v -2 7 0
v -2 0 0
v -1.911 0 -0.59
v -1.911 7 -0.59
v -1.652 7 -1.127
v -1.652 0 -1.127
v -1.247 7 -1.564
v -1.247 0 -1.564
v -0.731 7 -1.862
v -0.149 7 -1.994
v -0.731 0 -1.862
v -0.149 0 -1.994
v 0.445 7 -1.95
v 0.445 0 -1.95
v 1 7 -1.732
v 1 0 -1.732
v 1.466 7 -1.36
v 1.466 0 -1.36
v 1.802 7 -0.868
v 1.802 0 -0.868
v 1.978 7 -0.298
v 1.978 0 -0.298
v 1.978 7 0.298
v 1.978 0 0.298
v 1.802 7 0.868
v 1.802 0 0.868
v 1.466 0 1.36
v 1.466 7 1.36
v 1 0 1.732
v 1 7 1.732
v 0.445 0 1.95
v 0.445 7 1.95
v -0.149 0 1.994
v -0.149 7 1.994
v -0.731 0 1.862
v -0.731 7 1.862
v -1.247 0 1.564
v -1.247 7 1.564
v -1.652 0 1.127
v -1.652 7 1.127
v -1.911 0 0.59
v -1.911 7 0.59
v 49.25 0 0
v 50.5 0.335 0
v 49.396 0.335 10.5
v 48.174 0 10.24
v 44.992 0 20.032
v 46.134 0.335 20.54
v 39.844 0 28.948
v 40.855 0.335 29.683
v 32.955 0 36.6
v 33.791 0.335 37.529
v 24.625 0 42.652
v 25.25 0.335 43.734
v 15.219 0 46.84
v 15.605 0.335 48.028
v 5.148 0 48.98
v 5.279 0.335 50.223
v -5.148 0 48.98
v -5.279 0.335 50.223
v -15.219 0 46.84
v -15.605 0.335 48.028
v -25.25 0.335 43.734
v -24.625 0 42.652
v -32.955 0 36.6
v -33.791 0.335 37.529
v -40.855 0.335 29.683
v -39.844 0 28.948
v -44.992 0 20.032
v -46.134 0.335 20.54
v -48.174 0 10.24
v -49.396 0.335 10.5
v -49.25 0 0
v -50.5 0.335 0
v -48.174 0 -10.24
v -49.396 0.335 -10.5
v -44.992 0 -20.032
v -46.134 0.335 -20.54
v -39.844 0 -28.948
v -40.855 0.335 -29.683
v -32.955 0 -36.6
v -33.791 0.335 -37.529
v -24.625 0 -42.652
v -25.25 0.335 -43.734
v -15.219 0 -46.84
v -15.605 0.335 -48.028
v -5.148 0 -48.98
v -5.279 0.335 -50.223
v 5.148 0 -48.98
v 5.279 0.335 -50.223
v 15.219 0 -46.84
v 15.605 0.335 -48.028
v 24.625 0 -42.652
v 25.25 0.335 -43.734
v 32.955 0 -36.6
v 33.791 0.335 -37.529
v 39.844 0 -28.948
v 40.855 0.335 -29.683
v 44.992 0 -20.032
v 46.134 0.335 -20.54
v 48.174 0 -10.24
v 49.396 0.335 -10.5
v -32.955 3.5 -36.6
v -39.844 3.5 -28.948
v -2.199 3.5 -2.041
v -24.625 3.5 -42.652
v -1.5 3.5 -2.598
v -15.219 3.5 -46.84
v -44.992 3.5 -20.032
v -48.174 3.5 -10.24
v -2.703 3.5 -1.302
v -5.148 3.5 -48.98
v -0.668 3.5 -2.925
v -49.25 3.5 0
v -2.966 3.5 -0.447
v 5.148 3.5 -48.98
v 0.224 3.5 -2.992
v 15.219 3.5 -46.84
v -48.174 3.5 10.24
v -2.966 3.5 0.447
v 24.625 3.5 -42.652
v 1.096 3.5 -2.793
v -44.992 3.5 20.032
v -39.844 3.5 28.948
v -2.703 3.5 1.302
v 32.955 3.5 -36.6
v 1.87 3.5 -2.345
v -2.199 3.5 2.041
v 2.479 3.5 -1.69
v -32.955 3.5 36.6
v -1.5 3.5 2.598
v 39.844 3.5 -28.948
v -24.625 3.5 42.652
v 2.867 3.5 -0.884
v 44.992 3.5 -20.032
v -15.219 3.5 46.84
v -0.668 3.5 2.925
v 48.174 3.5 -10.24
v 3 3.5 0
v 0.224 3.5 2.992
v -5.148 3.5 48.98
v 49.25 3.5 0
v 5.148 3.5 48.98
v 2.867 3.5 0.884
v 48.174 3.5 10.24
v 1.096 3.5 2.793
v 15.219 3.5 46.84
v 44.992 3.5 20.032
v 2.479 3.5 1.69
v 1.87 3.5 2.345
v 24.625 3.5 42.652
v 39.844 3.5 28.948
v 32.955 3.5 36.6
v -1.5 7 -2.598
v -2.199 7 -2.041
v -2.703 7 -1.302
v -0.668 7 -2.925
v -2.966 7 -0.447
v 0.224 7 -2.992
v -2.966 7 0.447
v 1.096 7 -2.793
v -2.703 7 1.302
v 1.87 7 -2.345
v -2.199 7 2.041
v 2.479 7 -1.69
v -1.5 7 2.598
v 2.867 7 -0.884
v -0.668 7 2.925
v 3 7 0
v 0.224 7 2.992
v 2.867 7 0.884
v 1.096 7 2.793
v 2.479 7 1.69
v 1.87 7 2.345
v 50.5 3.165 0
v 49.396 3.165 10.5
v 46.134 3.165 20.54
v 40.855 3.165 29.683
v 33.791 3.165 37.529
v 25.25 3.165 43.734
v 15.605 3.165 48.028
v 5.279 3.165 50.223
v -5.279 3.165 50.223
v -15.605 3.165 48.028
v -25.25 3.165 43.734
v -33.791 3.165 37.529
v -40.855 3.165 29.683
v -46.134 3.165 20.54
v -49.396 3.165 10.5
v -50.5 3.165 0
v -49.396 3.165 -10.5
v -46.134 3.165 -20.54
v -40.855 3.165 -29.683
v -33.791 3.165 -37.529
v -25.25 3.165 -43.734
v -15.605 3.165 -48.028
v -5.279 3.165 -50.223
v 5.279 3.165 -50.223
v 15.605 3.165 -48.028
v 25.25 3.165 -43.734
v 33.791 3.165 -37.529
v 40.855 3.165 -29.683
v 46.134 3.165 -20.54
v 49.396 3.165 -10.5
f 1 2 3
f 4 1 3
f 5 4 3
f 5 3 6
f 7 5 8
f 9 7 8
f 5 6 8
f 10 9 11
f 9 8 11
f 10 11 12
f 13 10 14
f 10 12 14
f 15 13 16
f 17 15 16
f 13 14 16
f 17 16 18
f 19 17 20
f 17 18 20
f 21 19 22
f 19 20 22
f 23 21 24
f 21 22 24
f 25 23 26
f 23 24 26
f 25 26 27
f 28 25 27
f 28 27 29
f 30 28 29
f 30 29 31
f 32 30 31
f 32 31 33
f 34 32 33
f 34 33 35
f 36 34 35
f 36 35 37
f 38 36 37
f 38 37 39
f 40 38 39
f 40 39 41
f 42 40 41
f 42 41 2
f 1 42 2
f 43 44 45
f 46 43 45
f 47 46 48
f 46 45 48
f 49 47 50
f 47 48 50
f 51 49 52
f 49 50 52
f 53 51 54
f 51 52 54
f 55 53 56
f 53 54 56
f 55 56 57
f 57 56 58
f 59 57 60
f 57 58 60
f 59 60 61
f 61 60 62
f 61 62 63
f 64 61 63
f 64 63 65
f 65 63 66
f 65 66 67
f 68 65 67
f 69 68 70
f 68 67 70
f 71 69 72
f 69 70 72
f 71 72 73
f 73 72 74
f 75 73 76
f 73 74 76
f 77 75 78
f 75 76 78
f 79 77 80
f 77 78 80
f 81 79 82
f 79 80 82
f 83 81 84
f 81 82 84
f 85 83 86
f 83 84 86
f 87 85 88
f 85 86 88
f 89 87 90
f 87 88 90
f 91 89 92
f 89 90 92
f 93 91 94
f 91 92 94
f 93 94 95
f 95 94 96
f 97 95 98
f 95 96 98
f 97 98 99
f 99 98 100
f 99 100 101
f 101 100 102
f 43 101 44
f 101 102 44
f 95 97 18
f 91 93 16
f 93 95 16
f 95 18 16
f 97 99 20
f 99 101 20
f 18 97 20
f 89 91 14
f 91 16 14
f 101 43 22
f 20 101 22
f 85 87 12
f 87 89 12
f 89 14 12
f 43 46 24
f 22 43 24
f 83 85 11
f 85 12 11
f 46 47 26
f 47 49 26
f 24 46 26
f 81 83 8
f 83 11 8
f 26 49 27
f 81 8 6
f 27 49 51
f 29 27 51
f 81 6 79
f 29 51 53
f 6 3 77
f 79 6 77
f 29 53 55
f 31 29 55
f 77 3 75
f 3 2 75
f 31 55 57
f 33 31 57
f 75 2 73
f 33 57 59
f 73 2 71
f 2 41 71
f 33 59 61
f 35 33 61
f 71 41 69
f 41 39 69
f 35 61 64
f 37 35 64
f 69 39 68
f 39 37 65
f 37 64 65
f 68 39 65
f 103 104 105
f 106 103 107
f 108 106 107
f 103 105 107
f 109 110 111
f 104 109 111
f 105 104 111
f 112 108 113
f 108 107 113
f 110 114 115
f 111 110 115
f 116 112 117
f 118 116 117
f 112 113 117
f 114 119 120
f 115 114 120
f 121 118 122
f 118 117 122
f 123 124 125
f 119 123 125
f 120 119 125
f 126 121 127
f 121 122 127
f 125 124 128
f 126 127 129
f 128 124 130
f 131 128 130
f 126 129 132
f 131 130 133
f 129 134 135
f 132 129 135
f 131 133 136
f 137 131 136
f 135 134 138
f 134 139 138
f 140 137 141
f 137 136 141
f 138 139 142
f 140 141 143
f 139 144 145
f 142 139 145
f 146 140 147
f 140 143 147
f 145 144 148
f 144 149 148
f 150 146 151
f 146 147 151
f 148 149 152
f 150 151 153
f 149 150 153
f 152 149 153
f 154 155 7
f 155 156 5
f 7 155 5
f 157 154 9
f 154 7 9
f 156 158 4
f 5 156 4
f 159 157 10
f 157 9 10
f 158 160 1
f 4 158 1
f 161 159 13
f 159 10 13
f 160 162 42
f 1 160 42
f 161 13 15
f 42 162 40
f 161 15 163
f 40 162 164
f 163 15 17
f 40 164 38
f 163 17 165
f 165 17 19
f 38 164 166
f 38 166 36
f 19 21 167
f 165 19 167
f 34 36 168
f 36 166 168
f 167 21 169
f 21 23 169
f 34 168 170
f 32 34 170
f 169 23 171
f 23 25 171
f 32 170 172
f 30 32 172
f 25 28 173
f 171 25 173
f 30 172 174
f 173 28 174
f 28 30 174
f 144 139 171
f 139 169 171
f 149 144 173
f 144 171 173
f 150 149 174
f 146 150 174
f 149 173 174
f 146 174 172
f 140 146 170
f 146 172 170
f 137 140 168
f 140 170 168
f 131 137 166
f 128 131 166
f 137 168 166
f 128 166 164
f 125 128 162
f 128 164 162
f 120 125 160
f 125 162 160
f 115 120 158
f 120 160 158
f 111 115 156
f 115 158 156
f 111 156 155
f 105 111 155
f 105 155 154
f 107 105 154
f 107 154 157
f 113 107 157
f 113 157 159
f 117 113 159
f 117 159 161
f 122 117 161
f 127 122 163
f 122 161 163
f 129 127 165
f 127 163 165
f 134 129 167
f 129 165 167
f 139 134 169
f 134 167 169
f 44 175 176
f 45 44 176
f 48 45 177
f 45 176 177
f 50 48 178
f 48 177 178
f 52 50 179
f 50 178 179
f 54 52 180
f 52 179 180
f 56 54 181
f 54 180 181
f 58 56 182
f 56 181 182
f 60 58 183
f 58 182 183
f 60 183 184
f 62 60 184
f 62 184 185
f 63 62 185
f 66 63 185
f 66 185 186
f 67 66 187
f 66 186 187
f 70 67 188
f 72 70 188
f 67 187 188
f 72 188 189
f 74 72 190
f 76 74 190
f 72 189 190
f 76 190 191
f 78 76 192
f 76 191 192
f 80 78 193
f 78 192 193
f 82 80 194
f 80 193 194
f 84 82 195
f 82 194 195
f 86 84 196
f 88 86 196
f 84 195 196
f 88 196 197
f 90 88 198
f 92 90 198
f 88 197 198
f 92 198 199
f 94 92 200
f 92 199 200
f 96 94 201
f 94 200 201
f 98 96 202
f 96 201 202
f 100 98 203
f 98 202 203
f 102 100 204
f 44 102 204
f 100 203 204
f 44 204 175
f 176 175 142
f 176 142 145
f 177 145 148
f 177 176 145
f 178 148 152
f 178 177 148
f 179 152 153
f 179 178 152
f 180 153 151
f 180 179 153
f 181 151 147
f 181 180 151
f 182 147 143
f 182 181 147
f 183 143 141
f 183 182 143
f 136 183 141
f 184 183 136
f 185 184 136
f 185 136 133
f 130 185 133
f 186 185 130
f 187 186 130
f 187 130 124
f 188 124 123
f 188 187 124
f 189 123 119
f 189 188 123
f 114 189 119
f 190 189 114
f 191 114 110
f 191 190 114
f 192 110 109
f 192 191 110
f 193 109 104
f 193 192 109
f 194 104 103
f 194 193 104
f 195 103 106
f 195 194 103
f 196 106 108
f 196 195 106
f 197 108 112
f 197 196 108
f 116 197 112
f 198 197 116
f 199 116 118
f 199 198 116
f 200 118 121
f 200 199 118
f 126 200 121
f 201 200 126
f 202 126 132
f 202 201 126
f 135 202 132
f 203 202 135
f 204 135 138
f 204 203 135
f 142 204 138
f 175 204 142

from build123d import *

# Parameters (mm, degrees)
CHAMFER_1_SIZE           = 1.25
CHAMFER_1_SIZE2          = 0.334936491
CHAMFER_2_SIZE           = 1.25
CHAMFER_2_SIZE2          = 0.334936491
SKETCH_2_R               = 2
CUT_EXTRUDE_3_DEPTH      = 1
CUT_EXTRUDE_3_DEPTH_BACK = 8


with BuildPart() as part:
    # Эскиз1 → Повернуть2 (revolve)
    with BuildSketch(Plane.XY):
        Polygon((0, 0), (50.5, 0), (50.5, 3.5), (3, 3.5), (3, 7), (0, 7), align=None)
    revolve(axis=Axis((0, 7, 0), (0, -1, 0)))

    # Фаска1
    chamfer_1_edges = [part.edges().sort_by_distance(p)[0] for p in [
        (-50.5, 3.5, 0),
    ]]
    chamfer_1_side = [part.faces().sort_by_distance(p)[0] for p in [
        (-49.071644302, 3.5, 0),
    ]]
    chamfer(chamfer_1_edges, length=CHAMFER_1_SIZE, length2=CHAMFER_1_SIZE2, reference=chamfer_1_side[0])

    # Фаска2
    chamfer_2_edges = [part.edges().sort_by_distance(p)[0] for p in [
        (-50.5, 0, 0),
    ]]
    chamfer_2_side = [part.faces().sort_by_distance(p)[0] for p in [
        (0, 0, 0),
    ]]
    chamfer(chamfer_2_edges, length=CHAMFER_2_SIZE, length2=CHAMFER_2_SIZE2, reference=chamfer_2_side[0])

    # Эскиз2 → Вырез-Вытянуть3 (cut, two sides)
    with BuildSketch(Plane(origin=(0, 0, 0), x_dir=(-1, 0, 0), z_dir=(0, -1, 0))) as cut_extrude_3_sk:
        Circle(SKETCH_2_R)
    extrude(amount=CUT_EXTRUDE_3_DEPTH, mode=Mode.SUBTRACT)
    extrude(cut_extrude_3_sk.sketch, amount=-CUT_EXTRUDE_3_DEPTH_BACK, mode=Mode.SUBTRACT)


solid = part.part
